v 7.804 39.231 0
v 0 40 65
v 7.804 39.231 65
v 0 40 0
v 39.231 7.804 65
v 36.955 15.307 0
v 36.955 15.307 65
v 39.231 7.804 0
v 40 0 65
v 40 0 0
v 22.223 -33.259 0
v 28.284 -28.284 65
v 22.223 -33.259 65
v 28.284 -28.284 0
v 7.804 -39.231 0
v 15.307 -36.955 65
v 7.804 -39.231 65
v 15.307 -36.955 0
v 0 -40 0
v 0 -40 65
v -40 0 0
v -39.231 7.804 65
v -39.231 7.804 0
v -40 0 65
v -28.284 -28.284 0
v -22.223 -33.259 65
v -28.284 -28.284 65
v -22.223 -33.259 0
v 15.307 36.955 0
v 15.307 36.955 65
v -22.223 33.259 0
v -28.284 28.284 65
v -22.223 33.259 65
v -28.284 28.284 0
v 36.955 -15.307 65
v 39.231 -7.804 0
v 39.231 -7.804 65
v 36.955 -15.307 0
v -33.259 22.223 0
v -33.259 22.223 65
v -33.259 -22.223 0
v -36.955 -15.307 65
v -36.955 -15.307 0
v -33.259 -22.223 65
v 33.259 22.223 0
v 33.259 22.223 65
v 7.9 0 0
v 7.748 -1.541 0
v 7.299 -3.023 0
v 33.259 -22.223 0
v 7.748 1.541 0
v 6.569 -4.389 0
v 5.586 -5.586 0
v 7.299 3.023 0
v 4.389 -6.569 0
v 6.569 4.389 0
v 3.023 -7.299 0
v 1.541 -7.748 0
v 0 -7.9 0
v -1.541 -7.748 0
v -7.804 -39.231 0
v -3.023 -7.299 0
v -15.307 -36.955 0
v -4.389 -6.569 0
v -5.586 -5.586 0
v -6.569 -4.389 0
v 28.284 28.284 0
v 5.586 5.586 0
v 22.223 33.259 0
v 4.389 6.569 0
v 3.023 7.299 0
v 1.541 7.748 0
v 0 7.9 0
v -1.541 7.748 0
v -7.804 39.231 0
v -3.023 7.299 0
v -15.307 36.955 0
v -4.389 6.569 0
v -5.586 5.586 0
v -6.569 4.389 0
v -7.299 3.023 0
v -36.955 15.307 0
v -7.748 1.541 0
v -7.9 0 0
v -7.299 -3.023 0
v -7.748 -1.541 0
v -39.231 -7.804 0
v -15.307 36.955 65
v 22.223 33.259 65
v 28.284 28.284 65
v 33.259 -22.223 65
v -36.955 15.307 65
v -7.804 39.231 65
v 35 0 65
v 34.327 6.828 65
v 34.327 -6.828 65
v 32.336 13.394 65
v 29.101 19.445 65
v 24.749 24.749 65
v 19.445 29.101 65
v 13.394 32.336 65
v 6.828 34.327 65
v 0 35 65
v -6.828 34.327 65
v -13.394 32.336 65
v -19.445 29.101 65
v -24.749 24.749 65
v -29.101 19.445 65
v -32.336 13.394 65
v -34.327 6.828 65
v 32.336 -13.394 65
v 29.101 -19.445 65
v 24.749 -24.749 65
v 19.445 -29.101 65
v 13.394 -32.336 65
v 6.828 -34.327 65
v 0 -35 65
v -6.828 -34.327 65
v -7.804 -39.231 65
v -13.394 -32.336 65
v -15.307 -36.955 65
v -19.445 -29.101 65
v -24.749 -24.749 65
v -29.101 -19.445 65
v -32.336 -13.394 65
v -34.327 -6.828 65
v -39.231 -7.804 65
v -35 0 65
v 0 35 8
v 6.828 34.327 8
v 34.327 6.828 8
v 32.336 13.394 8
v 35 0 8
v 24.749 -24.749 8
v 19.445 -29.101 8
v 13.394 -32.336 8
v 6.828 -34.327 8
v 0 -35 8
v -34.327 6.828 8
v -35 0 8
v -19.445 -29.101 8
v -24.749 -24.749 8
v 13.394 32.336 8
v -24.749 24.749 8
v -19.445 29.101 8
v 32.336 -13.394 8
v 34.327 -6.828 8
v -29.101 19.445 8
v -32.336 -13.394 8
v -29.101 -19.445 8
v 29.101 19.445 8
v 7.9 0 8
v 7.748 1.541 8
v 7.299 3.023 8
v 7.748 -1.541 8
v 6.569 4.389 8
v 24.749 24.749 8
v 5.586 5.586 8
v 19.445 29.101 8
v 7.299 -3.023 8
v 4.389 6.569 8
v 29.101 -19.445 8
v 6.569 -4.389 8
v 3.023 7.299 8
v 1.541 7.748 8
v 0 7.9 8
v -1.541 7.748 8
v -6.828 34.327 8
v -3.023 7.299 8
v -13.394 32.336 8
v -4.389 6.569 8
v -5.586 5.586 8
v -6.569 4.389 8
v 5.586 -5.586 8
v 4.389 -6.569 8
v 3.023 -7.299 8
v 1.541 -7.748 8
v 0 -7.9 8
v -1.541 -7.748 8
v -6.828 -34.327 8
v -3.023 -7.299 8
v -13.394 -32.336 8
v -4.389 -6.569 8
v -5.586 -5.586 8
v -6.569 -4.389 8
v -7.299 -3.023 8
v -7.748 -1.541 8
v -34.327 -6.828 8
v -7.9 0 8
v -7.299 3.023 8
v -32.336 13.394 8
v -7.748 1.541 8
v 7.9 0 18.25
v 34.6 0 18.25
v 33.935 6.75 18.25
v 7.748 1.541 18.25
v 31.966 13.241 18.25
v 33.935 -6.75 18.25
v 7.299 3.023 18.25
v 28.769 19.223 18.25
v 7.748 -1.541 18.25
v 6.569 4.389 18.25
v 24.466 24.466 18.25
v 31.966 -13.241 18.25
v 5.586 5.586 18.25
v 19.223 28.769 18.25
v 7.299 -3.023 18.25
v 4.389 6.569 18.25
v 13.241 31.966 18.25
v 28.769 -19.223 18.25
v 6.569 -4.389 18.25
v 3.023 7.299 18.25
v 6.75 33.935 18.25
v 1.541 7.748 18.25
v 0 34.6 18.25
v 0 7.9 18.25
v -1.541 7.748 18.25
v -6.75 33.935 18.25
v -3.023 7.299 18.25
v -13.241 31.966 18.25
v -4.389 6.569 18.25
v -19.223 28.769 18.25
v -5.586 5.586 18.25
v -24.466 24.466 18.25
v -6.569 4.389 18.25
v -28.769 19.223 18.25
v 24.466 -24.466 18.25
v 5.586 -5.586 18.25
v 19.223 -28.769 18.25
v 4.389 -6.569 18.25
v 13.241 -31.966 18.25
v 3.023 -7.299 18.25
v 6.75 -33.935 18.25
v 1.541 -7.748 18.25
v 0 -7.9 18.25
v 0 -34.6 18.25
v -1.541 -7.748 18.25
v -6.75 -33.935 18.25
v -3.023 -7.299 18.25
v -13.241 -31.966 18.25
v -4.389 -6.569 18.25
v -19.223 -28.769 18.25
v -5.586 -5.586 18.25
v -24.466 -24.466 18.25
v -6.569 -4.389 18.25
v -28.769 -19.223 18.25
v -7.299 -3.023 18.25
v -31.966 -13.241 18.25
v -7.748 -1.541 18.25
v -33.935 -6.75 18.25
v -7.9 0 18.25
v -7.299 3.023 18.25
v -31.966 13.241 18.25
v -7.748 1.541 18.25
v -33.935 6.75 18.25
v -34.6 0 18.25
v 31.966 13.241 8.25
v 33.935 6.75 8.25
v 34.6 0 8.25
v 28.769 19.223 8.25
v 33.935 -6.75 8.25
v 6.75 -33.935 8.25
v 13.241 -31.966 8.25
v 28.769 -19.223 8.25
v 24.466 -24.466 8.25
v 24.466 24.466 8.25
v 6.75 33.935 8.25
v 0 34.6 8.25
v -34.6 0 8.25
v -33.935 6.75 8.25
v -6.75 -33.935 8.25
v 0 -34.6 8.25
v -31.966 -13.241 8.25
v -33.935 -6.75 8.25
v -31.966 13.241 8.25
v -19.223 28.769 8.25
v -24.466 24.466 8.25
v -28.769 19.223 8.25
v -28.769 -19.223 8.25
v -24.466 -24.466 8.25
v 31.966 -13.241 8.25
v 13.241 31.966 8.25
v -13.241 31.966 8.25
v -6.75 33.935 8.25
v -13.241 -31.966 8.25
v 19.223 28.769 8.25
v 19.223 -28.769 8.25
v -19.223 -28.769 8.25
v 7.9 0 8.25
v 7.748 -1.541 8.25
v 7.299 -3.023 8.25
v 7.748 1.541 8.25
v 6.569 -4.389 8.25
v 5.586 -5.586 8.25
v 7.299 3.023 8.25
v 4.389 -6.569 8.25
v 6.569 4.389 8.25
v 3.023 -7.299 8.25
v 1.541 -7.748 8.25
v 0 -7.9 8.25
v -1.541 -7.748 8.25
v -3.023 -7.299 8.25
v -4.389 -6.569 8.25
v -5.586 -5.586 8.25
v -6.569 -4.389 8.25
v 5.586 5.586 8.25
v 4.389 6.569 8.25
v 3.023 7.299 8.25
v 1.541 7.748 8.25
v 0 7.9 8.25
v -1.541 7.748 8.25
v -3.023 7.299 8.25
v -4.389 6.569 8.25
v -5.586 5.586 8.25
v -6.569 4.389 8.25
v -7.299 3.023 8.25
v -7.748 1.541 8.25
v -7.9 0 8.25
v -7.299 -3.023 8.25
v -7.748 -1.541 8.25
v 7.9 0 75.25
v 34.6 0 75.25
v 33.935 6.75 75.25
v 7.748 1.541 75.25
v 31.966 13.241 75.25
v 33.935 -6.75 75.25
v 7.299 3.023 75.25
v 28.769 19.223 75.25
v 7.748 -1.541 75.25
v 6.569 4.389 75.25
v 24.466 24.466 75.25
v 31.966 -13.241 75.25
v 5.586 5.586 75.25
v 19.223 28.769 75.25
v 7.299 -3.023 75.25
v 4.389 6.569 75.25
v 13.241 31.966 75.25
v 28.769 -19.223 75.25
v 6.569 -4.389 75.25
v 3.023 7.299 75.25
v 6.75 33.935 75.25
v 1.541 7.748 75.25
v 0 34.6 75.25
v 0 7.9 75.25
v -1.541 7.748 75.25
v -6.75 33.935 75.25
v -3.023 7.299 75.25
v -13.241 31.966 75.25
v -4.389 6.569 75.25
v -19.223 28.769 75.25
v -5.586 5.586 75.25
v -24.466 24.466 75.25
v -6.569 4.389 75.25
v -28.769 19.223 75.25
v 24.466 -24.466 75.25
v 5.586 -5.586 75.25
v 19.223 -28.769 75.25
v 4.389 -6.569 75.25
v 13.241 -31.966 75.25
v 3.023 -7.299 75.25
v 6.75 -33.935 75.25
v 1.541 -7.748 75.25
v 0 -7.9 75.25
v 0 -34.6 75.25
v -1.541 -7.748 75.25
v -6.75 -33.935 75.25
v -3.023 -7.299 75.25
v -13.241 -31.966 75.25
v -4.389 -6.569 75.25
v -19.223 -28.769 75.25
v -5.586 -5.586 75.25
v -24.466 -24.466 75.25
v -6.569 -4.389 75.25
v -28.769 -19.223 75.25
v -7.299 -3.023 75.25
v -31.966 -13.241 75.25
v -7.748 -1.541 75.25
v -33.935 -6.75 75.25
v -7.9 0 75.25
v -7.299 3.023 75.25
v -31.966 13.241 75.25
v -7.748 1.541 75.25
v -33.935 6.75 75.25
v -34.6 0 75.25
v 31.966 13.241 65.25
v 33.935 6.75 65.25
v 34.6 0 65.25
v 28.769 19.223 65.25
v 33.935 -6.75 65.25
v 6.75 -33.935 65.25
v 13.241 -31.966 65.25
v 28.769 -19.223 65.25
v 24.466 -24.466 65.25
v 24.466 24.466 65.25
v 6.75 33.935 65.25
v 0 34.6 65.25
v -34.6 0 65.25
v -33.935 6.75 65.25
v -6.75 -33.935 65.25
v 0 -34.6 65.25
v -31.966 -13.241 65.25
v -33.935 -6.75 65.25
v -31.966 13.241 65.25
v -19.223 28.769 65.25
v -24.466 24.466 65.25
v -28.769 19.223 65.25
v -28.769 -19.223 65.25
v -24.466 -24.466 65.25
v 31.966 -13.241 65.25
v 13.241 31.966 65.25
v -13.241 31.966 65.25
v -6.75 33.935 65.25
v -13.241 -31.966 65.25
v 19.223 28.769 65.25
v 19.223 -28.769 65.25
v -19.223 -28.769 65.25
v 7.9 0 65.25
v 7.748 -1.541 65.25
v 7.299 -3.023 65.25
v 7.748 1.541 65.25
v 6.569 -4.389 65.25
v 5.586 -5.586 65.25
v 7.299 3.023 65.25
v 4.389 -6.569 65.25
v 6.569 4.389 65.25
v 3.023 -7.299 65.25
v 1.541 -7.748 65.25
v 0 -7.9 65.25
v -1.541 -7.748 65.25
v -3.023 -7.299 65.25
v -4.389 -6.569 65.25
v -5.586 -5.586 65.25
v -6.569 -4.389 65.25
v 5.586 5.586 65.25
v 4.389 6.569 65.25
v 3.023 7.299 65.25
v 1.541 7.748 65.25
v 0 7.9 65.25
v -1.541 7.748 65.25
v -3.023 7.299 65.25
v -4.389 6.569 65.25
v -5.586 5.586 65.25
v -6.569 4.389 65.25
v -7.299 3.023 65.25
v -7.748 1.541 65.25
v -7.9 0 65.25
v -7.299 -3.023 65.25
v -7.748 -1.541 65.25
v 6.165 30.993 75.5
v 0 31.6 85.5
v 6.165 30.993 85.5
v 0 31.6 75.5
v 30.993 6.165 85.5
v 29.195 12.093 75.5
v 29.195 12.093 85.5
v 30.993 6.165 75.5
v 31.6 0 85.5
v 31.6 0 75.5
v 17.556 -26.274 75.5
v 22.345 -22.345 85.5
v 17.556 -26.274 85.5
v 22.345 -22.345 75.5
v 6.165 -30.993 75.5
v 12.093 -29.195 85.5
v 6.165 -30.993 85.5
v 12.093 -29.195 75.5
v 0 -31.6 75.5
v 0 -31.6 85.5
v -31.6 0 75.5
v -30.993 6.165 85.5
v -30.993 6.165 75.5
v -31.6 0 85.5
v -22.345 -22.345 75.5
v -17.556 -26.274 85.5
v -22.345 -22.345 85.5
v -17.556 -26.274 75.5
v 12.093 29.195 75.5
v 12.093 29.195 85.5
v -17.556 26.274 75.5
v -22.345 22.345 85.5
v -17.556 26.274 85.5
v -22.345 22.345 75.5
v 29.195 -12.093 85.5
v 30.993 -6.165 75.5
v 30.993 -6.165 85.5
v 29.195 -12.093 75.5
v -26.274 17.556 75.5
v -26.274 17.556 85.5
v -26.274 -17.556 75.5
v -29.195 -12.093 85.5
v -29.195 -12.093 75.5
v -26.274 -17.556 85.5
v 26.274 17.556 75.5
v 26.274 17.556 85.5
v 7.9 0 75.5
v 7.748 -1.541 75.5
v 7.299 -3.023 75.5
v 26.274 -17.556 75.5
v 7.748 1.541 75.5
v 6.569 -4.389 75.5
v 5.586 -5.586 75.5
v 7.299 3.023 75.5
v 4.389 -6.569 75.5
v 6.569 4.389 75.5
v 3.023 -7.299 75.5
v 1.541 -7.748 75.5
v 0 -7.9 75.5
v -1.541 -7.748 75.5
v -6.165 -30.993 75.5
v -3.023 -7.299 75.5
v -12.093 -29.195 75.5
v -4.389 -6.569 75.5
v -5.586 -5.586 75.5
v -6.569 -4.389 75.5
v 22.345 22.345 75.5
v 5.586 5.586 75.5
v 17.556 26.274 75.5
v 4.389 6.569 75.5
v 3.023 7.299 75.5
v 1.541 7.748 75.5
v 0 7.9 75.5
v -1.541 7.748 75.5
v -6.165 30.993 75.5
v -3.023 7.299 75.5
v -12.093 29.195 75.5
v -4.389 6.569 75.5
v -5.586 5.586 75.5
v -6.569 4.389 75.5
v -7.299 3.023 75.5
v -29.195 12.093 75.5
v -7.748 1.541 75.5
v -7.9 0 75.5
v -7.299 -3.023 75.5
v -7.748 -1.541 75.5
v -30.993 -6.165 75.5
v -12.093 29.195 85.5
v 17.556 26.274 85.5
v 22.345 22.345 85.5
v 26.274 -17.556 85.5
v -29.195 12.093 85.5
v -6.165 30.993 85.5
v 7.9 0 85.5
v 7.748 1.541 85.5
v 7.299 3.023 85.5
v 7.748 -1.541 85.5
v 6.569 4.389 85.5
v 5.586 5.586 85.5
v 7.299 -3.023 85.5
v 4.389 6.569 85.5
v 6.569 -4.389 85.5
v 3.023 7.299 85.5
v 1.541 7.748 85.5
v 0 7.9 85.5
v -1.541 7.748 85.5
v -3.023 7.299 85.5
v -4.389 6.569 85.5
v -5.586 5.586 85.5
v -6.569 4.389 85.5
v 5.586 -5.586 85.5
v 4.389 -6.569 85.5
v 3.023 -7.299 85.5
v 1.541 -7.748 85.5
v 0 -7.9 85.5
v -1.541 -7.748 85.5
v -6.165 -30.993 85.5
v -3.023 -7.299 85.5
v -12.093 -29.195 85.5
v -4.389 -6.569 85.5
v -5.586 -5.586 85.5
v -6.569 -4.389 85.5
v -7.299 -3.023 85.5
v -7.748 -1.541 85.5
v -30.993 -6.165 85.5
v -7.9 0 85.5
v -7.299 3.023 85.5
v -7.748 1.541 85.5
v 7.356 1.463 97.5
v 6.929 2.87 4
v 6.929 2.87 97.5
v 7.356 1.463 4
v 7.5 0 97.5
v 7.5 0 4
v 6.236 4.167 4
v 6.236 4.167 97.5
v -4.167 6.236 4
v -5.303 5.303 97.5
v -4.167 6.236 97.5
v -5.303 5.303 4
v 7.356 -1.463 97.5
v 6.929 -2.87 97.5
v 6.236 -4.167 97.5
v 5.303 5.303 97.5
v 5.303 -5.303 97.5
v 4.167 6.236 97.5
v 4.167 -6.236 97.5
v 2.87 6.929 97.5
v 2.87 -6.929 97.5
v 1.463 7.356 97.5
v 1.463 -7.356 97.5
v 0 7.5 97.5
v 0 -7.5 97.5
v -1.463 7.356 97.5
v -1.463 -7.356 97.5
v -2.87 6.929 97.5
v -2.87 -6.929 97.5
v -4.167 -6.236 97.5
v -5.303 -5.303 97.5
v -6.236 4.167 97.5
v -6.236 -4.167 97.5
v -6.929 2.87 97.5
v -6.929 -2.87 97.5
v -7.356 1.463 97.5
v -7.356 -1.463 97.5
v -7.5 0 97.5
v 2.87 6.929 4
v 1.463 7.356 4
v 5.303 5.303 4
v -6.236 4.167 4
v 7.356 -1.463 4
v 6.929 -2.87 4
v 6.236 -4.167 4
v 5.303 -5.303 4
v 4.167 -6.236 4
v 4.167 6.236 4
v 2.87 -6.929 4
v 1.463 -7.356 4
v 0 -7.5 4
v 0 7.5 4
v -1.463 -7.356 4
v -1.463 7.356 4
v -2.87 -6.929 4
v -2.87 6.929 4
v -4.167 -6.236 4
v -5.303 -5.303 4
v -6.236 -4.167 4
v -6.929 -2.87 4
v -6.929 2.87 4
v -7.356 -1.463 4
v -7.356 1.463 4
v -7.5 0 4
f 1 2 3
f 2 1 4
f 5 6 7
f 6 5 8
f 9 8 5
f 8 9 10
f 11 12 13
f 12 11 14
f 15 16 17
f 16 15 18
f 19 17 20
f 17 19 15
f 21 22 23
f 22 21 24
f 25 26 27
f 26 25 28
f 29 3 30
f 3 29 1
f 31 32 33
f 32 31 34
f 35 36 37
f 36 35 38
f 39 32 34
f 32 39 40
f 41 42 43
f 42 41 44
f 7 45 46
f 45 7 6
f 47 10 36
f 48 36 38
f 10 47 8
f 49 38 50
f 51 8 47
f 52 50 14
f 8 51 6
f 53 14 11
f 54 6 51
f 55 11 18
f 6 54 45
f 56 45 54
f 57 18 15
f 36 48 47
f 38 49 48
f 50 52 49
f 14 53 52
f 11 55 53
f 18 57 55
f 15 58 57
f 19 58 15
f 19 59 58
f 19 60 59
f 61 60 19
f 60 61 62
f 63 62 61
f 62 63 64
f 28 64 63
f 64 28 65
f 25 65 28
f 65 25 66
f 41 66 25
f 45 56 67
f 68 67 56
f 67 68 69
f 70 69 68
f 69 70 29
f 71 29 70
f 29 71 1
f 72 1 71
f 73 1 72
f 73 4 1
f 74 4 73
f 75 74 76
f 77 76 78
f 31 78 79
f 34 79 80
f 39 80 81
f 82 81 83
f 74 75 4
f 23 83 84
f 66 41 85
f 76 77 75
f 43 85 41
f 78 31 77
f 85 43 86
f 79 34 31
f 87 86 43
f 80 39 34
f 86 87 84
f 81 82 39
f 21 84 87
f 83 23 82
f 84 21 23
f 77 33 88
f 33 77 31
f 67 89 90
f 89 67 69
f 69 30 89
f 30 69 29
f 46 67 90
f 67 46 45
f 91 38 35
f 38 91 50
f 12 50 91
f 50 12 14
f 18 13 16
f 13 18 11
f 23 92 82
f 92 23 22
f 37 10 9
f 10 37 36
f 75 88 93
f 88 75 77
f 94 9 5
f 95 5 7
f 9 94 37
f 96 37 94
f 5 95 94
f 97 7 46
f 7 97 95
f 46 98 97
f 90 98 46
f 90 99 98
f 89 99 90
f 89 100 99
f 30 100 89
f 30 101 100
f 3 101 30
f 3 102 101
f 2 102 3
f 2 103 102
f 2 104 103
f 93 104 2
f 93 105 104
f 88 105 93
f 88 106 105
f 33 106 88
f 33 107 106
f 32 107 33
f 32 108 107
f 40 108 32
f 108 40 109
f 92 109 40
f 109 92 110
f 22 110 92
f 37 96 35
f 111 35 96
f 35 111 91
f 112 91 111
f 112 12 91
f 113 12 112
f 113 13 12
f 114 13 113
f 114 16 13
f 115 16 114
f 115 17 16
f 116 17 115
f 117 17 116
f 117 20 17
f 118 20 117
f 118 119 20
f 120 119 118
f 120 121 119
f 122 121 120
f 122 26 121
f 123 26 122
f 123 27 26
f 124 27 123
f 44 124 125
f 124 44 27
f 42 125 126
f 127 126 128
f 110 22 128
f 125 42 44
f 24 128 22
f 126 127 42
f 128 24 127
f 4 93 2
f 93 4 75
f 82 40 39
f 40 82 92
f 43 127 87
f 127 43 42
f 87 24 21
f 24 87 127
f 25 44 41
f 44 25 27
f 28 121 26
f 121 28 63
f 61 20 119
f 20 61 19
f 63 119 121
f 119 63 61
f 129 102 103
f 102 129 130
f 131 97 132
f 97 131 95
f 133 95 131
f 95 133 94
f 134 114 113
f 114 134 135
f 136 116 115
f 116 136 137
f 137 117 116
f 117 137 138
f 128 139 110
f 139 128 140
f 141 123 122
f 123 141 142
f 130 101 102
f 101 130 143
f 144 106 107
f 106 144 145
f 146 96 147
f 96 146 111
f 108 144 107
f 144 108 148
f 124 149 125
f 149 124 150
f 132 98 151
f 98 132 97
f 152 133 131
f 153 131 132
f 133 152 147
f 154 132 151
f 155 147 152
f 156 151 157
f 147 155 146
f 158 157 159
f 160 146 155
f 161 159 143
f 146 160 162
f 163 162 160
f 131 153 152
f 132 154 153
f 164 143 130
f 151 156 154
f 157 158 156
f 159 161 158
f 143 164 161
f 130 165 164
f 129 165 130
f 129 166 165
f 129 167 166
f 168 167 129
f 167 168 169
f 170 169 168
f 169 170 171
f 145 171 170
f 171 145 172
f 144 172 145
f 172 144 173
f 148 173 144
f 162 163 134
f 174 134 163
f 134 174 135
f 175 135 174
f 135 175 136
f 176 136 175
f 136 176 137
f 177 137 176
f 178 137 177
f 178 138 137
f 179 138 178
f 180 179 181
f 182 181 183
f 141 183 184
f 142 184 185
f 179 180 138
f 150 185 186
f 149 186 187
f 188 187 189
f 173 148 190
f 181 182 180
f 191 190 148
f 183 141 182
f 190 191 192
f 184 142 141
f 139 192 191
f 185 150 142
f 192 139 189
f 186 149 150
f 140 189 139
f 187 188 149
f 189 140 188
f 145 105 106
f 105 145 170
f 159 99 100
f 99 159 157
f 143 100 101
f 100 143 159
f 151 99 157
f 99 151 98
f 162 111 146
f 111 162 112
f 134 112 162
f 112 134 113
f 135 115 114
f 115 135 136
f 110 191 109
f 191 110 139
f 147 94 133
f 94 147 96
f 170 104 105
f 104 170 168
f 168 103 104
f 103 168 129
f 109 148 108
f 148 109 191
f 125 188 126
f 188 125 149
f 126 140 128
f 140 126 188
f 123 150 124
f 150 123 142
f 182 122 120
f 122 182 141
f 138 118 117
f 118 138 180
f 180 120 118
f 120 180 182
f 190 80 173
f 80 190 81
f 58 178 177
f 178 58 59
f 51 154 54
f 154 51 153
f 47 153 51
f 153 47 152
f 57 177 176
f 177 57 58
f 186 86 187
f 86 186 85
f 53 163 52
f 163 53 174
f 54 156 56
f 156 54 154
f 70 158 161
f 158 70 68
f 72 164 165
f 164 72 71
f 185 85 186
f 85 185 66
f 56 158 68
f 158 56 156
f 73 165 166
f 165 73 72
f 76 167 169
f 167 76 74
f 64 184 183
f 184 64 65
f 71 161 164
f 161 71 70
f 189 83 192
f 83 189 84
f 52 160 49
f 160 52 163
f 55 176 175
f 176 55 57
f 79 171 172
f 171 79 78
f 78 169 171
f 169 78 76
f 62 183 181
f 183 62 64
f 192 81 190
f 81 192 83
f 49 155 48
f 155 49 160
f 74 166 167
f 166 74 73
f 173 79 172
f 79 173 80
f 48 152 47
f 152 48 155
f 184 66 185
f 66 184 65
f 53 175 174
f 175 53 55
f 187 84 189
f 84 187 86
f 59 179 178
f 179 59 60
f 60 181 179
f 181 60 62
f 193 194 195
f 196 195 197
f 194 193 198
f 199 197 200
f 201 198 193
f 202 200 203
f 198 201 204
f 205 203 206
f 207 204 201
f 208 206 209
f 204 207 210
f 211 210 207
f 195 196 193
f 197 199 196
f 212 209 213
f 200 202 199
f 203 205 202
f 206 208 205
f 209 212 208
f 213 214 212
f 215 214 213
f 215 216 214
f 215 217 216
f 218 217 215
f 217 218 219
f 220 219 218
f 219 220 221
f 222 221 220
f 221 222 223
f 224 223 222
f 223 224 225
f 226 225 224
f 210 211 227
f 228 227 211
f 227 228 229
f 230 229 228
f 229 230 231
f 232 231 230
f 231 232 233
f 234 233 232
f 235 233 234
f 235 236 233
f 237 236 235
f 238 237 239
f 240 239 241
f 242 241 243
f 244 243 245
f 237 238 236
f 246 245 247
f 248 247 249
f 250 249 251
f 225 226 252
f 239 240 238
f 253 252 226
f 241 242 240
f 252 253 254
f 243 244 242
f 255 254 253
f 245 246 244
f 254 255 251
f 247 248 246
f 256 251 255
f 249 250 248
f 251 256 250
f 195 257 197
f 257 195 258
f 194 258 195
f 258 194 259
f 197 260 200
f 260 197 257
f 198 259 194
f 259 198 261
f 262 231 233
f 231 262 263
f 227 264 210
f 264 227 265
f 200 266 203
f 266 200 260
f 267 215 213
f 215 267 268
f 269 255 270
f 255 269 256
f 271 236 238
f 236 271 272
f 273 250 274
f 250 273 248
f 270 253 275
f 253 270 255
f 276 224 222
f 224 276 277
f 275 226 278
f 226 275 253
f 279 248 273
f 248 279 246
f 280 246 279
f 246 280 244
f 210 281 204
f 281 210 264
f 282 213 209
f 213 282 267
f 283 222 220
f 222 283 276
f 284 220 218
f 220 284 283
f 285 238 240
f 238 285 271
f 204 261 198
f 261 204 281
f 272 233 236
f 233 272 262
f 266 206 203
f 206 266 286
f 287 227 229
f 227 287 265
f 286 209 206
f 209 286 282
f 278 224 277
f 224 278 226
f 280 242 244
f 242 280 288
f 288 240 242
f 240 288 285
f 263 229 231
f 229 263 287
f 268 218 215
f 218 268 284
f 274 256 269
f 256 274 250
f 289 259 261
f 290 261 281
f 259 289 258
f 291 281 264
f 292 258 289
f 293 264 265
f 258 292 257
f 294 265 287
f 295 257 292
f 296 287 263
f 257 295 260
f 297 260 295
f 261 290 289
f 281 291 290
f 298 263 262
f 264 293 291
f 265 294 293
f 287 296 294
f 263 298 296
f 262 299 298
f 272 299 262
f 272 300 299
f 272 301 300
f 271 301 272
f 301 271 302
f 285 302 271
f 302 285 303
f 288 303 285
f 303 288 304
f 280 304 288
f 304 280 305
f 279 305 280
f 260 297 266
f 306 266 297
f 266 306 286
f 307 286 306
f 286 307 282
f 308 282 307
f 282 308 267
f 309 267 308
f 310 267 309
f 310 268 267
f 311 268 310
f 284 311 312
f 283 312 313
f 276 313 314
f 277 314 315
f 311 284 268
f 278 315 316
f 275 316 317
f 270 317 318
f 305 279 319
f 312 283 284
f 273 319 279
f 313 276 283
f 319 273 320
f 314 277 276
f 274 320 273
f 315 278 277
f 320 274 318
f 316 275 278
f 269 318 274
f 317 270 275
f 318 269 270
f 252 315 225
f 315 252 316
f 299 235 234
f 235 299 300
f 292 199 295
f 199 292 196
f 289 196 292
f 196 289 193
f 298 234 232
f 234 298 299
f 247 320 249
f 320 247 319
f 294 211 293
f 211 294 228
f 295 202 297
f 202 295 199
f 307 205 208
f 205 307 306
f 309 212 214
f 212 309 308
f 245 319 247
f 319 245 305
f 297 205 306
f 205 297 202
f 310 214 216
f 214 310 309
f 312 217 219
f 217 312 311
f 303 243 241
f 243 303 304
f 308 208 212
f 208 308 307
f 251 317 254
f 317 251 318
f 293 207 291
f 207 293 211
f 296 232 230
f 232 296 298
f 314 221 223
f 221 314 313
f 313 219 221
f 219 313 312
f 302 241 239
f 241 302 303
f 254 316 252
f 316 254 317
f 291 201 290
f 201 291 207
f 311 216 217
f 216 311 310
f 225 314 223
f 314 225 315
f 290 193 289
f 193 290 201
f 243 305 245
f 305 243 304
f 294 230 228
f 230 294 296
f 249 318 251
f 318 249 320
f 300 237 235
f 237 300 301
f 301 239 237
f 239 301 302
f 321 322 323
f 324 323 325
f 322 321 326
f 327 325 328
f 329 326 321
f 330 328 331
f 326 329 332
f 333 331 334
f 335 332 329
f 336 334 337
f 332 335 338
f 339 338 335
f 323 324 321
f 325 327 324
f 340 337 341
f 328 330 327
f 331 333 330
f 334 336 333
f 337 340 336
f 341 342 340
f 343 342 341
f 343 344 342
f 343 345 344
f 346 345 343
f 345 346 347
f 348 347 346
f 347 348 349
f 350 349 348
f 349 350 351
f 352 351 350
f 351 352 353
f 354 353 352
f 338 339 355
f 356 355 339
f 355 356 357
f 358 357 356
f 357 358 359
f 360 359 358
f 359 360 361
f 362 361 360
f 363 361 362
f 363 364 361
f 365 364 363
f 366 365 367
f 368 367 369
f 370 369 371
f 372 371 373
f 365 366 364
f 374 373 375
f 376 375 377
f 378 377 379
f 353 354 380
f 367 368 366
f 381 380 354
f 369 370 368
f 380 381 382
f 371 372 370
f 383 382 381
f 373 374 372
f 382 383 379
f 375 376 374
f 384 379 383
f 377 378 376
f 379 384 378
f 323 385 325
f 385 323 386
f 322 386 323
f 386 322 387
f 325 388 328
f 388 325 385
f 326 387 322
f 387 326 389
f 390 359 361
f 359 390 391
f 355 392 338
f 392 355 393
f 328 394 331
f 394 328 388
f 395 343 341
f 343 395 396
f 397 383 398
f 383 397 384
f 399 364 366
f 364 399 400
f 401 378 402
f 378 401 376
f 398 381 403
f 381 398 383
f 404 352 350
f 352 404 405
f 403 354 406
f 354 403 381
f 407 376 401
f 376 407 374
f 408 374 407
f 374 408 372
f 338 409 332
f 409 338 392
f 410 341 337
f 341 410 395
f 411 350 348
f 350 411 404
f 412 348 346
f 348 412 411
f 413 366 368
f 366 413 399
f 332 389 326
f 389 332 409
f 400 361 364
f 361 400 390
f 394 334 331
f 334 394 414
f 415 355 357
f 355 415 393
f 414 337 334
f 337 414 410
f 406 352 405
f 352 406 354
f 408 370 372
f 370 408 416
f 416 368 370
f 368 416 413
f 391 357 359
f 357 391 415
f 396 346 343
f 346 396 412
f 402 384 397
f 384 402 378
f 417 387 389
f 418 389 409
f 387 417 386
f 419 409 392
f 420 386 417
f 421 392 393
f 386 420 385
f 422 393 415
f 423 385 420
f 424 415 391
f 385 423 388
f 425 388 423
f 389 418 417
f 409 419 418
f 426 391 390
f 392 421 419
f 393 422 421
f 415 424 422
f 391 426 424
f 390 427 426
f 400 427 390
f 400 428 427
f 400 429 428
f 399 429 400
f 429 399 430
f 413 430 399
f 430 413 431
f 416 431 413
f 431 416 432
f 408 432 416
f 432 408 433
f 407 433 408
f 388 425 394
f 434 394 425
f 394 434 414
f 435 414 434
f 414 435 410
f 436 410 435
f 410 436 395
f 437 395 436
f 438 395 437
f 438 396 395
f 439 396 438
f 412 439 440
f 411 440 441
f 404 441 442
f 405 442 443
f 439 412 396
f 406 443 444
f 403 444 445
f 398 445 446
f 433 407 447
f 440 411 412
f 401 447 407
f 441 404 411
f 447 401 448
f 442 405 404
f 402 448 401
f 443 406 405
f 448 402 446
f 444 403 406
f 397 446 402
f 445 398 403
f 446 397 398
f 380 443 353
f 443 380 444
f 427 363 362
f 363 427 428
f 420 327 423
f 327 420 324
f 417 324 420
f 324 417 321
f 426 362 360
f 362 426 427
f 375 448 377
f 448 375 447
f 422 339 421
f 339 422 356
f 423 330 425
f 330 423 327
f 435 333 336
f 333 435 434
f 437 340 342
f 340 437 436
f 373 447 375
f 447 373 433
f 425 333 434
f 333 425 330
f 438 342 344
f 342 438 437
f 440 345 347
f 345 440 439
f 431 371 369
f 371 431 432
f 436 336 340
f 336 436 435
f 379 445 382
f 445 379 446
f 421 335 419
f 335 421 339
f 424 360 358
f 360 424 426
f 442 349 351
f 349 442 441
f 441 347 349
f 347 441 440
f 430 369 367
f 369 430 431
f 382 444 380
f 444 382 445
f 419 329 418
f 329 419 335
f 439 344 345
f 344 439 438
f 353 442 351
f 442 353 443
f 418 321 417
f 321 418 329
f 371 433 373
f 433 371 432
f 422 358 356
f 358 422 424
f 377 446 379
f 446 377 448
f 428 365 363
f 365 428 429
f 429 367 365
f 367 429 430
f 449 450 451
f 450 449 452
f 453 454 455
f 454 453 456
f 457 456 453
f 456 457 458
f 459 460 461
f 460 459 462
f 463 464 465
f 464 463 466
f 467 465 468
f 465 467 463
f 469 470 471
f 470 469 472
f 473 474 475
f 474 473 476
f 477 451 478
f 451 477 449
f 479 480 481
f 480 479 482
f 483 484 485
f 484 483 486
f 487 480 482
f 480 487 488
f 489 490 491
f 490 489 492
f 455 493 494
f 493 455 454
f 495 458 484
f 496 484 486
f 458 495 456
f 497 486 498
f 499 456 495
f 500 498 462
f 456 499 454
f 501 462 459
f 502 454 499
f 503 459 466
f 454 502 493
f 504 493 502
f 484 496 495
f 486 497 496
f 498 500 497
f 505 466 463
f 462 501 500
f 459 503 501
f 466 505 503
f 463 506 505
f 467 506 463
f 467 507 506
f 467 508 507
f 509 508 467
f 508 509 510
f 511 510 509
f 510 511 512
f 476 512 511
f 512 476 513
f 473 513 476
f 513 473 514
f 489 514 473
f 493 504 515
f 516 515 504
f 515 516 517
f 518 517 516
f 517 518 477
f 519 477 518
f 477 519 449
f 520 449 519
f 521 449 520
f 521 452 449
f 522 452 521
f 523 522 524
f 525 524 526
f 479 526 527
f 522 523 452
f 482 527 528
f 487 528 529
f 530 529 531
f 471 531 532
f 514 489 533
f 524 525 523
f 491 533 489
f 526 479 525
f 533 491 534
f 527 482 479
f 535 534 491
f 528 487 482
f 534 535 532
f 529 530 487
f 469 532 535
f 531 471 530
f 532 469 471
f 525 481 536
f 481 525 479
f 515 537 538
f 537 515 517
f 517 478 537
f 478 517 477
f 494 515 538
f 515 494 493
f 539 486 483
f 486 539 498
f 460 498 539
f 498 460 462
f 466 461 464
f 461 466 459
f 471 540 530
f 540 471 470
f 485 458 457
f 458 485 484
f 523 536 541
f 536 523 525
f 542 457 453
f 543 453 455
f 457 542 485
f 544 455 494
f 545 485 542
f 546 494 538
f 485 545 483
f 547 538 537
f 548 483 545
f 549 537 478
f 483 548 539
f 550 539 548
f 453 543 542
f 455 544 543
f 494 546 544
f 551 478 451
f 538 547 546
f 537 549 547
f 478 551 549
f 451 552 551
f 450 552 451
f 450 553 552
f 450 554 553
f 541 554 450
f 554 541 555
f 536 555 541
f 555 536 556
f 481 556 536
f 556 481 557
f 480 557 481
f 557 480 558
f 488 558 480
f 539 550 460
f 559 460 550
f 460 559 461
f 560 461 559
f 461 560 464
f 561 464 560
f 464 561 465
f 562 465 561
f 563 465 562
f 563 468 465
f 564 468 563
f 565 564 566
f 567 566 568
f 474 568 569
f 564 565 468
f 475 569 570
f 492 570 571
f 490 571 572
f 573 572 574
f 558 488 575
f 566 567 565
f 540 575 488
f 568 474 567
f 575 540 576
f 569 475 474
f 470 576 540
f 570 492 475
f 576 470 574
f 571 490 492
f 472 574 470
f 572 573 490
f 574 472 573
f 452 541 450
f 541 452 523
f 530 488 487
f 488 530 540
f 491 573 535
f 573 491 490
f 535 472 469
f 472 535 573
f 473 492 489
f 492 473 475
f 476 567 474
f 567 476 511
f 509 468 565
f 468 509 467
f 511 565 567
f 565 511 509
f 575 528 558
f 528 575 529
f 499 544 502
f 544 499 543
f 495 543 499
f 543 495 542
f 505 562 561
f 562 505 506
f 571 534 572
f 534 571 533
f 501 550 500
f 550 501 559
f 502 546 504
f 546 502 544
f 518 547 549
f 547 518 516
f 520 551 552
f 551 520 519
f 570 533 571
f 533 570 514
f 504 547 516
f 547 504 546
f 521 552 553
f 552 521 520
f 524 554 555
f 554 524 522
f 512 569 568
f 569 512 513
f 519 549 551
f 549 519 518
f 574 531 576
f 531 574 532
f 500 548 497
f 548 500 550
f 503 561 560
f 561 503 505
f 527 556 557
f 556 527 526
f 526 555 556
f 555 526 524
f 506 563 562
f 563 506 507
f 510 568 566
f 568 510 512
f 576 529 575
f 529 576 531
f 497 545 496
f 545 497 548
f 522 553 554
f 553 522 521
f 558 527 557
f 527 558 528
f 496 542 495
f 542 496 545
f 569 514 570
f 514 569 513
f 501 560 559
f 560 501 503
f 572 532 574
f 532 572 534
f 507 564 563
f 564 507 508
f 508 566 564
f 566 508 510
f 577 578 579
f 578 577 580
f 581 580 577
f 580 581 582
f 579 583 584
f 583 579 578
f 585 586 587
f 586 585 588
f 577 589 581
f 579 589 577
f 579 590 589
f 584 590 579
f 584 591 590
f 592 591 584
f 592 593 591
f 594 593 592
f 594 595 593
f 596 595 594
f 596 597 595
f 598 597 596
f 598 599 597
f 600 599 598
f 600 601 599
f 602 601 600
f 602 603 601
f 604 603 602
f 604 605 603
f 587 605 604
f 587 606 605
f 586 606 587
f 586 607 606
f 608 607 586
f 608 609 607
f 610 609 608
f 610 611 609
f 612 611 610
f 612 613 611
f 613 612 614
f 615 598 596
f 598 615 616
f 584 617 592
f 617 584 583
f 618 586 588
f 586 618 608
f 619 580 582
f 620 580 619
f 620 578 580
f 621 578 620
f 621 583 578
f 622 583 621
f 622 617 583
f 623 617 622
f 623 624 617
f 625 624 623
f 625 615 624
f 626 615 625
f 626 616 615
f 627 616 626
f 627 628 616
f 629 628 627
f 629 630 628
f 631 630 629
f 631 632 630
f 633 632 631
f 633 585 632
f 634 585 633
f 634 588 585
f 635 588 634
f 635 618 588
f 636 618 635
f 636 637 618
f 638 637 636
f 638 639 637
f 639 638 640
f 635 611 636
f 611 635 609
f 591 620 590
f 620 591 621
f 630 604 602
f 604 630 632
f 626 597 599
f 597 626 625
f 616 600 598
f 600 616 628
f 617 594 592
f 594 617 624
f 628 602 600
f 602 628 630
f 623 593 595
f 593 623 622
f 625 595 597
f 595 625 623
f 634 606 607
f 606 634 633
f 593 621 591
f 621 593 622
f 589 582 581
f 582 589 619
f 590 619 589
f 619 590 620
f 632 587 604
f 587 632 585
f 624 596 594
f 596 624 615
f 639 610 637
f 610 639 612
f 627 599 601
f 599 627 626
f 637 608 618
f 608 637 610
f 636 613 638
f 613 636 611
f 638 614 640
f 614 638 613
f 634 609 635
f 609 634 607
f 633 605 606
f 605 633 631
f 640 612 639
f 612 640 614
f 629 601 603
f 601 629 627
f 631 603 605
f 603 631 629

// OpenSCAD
$fn = 32;

// ------------------------------------------------------------------------
// Bearing housing: housing d80, two bearings and a shaft
// Every part is its own module, assembly() places them once.
// ------------------------------------------------------------------------

// --- part 1 ---
module housing() {
  difference() {
    cylinder(h = 65, d = 80);
    translate([0, 0, 8]) cylinder(h = 58, d = 70);
    translate([0, 0, -1]) cylinder(h = 10, d = 15.8);
  }
}

// --- part 2 ---
module bearing_lower() {
  difference() {
      translate([0, 0, 0]) cylinder(h = 10, d = 69.2);
      translate([0, 0, -1]) cylinder(h = 12, d = 15.8);
    }
}

// --- part 3 ---
module bearing_upper() {
  difference() {
      translate([0, 0, 0]) cylinder(h = 10, d = 69.2);
      translate([0, 0, -1]) cylinder(h = 12, d = 15.8);
    }
}

// --- part 4 ---
module spacer() {
  difference() {
      translate([0, 0, 0]) cylinder(h = 10, d = 63.2);
      translate([0, 0, -1]) cylinder(h = 12, d = 15.8);
    }
}

// --- part 5 ---
module shaft() {
  translate([0, 0, -46.75]) cylinder(h = 93.5, d = 15);
}

// --- assembly ---
module assembly() {
  translate([0, 0, 0]) rotate([0, 0, 0]) housing();
  translate([0, 0, 8.25]) rotate([0, 0, 0]) bearing_lower();
  translate([0, 0, 65.25]) rotate([0, 0, 0]) bearing_upper();
  translate([0, 0, 75.5]) rotate([0, 0, 0]) spacer();
  translate([0, 0, 50.75]) rotate([0, 0, 0]) shaft();
}

assembly();
